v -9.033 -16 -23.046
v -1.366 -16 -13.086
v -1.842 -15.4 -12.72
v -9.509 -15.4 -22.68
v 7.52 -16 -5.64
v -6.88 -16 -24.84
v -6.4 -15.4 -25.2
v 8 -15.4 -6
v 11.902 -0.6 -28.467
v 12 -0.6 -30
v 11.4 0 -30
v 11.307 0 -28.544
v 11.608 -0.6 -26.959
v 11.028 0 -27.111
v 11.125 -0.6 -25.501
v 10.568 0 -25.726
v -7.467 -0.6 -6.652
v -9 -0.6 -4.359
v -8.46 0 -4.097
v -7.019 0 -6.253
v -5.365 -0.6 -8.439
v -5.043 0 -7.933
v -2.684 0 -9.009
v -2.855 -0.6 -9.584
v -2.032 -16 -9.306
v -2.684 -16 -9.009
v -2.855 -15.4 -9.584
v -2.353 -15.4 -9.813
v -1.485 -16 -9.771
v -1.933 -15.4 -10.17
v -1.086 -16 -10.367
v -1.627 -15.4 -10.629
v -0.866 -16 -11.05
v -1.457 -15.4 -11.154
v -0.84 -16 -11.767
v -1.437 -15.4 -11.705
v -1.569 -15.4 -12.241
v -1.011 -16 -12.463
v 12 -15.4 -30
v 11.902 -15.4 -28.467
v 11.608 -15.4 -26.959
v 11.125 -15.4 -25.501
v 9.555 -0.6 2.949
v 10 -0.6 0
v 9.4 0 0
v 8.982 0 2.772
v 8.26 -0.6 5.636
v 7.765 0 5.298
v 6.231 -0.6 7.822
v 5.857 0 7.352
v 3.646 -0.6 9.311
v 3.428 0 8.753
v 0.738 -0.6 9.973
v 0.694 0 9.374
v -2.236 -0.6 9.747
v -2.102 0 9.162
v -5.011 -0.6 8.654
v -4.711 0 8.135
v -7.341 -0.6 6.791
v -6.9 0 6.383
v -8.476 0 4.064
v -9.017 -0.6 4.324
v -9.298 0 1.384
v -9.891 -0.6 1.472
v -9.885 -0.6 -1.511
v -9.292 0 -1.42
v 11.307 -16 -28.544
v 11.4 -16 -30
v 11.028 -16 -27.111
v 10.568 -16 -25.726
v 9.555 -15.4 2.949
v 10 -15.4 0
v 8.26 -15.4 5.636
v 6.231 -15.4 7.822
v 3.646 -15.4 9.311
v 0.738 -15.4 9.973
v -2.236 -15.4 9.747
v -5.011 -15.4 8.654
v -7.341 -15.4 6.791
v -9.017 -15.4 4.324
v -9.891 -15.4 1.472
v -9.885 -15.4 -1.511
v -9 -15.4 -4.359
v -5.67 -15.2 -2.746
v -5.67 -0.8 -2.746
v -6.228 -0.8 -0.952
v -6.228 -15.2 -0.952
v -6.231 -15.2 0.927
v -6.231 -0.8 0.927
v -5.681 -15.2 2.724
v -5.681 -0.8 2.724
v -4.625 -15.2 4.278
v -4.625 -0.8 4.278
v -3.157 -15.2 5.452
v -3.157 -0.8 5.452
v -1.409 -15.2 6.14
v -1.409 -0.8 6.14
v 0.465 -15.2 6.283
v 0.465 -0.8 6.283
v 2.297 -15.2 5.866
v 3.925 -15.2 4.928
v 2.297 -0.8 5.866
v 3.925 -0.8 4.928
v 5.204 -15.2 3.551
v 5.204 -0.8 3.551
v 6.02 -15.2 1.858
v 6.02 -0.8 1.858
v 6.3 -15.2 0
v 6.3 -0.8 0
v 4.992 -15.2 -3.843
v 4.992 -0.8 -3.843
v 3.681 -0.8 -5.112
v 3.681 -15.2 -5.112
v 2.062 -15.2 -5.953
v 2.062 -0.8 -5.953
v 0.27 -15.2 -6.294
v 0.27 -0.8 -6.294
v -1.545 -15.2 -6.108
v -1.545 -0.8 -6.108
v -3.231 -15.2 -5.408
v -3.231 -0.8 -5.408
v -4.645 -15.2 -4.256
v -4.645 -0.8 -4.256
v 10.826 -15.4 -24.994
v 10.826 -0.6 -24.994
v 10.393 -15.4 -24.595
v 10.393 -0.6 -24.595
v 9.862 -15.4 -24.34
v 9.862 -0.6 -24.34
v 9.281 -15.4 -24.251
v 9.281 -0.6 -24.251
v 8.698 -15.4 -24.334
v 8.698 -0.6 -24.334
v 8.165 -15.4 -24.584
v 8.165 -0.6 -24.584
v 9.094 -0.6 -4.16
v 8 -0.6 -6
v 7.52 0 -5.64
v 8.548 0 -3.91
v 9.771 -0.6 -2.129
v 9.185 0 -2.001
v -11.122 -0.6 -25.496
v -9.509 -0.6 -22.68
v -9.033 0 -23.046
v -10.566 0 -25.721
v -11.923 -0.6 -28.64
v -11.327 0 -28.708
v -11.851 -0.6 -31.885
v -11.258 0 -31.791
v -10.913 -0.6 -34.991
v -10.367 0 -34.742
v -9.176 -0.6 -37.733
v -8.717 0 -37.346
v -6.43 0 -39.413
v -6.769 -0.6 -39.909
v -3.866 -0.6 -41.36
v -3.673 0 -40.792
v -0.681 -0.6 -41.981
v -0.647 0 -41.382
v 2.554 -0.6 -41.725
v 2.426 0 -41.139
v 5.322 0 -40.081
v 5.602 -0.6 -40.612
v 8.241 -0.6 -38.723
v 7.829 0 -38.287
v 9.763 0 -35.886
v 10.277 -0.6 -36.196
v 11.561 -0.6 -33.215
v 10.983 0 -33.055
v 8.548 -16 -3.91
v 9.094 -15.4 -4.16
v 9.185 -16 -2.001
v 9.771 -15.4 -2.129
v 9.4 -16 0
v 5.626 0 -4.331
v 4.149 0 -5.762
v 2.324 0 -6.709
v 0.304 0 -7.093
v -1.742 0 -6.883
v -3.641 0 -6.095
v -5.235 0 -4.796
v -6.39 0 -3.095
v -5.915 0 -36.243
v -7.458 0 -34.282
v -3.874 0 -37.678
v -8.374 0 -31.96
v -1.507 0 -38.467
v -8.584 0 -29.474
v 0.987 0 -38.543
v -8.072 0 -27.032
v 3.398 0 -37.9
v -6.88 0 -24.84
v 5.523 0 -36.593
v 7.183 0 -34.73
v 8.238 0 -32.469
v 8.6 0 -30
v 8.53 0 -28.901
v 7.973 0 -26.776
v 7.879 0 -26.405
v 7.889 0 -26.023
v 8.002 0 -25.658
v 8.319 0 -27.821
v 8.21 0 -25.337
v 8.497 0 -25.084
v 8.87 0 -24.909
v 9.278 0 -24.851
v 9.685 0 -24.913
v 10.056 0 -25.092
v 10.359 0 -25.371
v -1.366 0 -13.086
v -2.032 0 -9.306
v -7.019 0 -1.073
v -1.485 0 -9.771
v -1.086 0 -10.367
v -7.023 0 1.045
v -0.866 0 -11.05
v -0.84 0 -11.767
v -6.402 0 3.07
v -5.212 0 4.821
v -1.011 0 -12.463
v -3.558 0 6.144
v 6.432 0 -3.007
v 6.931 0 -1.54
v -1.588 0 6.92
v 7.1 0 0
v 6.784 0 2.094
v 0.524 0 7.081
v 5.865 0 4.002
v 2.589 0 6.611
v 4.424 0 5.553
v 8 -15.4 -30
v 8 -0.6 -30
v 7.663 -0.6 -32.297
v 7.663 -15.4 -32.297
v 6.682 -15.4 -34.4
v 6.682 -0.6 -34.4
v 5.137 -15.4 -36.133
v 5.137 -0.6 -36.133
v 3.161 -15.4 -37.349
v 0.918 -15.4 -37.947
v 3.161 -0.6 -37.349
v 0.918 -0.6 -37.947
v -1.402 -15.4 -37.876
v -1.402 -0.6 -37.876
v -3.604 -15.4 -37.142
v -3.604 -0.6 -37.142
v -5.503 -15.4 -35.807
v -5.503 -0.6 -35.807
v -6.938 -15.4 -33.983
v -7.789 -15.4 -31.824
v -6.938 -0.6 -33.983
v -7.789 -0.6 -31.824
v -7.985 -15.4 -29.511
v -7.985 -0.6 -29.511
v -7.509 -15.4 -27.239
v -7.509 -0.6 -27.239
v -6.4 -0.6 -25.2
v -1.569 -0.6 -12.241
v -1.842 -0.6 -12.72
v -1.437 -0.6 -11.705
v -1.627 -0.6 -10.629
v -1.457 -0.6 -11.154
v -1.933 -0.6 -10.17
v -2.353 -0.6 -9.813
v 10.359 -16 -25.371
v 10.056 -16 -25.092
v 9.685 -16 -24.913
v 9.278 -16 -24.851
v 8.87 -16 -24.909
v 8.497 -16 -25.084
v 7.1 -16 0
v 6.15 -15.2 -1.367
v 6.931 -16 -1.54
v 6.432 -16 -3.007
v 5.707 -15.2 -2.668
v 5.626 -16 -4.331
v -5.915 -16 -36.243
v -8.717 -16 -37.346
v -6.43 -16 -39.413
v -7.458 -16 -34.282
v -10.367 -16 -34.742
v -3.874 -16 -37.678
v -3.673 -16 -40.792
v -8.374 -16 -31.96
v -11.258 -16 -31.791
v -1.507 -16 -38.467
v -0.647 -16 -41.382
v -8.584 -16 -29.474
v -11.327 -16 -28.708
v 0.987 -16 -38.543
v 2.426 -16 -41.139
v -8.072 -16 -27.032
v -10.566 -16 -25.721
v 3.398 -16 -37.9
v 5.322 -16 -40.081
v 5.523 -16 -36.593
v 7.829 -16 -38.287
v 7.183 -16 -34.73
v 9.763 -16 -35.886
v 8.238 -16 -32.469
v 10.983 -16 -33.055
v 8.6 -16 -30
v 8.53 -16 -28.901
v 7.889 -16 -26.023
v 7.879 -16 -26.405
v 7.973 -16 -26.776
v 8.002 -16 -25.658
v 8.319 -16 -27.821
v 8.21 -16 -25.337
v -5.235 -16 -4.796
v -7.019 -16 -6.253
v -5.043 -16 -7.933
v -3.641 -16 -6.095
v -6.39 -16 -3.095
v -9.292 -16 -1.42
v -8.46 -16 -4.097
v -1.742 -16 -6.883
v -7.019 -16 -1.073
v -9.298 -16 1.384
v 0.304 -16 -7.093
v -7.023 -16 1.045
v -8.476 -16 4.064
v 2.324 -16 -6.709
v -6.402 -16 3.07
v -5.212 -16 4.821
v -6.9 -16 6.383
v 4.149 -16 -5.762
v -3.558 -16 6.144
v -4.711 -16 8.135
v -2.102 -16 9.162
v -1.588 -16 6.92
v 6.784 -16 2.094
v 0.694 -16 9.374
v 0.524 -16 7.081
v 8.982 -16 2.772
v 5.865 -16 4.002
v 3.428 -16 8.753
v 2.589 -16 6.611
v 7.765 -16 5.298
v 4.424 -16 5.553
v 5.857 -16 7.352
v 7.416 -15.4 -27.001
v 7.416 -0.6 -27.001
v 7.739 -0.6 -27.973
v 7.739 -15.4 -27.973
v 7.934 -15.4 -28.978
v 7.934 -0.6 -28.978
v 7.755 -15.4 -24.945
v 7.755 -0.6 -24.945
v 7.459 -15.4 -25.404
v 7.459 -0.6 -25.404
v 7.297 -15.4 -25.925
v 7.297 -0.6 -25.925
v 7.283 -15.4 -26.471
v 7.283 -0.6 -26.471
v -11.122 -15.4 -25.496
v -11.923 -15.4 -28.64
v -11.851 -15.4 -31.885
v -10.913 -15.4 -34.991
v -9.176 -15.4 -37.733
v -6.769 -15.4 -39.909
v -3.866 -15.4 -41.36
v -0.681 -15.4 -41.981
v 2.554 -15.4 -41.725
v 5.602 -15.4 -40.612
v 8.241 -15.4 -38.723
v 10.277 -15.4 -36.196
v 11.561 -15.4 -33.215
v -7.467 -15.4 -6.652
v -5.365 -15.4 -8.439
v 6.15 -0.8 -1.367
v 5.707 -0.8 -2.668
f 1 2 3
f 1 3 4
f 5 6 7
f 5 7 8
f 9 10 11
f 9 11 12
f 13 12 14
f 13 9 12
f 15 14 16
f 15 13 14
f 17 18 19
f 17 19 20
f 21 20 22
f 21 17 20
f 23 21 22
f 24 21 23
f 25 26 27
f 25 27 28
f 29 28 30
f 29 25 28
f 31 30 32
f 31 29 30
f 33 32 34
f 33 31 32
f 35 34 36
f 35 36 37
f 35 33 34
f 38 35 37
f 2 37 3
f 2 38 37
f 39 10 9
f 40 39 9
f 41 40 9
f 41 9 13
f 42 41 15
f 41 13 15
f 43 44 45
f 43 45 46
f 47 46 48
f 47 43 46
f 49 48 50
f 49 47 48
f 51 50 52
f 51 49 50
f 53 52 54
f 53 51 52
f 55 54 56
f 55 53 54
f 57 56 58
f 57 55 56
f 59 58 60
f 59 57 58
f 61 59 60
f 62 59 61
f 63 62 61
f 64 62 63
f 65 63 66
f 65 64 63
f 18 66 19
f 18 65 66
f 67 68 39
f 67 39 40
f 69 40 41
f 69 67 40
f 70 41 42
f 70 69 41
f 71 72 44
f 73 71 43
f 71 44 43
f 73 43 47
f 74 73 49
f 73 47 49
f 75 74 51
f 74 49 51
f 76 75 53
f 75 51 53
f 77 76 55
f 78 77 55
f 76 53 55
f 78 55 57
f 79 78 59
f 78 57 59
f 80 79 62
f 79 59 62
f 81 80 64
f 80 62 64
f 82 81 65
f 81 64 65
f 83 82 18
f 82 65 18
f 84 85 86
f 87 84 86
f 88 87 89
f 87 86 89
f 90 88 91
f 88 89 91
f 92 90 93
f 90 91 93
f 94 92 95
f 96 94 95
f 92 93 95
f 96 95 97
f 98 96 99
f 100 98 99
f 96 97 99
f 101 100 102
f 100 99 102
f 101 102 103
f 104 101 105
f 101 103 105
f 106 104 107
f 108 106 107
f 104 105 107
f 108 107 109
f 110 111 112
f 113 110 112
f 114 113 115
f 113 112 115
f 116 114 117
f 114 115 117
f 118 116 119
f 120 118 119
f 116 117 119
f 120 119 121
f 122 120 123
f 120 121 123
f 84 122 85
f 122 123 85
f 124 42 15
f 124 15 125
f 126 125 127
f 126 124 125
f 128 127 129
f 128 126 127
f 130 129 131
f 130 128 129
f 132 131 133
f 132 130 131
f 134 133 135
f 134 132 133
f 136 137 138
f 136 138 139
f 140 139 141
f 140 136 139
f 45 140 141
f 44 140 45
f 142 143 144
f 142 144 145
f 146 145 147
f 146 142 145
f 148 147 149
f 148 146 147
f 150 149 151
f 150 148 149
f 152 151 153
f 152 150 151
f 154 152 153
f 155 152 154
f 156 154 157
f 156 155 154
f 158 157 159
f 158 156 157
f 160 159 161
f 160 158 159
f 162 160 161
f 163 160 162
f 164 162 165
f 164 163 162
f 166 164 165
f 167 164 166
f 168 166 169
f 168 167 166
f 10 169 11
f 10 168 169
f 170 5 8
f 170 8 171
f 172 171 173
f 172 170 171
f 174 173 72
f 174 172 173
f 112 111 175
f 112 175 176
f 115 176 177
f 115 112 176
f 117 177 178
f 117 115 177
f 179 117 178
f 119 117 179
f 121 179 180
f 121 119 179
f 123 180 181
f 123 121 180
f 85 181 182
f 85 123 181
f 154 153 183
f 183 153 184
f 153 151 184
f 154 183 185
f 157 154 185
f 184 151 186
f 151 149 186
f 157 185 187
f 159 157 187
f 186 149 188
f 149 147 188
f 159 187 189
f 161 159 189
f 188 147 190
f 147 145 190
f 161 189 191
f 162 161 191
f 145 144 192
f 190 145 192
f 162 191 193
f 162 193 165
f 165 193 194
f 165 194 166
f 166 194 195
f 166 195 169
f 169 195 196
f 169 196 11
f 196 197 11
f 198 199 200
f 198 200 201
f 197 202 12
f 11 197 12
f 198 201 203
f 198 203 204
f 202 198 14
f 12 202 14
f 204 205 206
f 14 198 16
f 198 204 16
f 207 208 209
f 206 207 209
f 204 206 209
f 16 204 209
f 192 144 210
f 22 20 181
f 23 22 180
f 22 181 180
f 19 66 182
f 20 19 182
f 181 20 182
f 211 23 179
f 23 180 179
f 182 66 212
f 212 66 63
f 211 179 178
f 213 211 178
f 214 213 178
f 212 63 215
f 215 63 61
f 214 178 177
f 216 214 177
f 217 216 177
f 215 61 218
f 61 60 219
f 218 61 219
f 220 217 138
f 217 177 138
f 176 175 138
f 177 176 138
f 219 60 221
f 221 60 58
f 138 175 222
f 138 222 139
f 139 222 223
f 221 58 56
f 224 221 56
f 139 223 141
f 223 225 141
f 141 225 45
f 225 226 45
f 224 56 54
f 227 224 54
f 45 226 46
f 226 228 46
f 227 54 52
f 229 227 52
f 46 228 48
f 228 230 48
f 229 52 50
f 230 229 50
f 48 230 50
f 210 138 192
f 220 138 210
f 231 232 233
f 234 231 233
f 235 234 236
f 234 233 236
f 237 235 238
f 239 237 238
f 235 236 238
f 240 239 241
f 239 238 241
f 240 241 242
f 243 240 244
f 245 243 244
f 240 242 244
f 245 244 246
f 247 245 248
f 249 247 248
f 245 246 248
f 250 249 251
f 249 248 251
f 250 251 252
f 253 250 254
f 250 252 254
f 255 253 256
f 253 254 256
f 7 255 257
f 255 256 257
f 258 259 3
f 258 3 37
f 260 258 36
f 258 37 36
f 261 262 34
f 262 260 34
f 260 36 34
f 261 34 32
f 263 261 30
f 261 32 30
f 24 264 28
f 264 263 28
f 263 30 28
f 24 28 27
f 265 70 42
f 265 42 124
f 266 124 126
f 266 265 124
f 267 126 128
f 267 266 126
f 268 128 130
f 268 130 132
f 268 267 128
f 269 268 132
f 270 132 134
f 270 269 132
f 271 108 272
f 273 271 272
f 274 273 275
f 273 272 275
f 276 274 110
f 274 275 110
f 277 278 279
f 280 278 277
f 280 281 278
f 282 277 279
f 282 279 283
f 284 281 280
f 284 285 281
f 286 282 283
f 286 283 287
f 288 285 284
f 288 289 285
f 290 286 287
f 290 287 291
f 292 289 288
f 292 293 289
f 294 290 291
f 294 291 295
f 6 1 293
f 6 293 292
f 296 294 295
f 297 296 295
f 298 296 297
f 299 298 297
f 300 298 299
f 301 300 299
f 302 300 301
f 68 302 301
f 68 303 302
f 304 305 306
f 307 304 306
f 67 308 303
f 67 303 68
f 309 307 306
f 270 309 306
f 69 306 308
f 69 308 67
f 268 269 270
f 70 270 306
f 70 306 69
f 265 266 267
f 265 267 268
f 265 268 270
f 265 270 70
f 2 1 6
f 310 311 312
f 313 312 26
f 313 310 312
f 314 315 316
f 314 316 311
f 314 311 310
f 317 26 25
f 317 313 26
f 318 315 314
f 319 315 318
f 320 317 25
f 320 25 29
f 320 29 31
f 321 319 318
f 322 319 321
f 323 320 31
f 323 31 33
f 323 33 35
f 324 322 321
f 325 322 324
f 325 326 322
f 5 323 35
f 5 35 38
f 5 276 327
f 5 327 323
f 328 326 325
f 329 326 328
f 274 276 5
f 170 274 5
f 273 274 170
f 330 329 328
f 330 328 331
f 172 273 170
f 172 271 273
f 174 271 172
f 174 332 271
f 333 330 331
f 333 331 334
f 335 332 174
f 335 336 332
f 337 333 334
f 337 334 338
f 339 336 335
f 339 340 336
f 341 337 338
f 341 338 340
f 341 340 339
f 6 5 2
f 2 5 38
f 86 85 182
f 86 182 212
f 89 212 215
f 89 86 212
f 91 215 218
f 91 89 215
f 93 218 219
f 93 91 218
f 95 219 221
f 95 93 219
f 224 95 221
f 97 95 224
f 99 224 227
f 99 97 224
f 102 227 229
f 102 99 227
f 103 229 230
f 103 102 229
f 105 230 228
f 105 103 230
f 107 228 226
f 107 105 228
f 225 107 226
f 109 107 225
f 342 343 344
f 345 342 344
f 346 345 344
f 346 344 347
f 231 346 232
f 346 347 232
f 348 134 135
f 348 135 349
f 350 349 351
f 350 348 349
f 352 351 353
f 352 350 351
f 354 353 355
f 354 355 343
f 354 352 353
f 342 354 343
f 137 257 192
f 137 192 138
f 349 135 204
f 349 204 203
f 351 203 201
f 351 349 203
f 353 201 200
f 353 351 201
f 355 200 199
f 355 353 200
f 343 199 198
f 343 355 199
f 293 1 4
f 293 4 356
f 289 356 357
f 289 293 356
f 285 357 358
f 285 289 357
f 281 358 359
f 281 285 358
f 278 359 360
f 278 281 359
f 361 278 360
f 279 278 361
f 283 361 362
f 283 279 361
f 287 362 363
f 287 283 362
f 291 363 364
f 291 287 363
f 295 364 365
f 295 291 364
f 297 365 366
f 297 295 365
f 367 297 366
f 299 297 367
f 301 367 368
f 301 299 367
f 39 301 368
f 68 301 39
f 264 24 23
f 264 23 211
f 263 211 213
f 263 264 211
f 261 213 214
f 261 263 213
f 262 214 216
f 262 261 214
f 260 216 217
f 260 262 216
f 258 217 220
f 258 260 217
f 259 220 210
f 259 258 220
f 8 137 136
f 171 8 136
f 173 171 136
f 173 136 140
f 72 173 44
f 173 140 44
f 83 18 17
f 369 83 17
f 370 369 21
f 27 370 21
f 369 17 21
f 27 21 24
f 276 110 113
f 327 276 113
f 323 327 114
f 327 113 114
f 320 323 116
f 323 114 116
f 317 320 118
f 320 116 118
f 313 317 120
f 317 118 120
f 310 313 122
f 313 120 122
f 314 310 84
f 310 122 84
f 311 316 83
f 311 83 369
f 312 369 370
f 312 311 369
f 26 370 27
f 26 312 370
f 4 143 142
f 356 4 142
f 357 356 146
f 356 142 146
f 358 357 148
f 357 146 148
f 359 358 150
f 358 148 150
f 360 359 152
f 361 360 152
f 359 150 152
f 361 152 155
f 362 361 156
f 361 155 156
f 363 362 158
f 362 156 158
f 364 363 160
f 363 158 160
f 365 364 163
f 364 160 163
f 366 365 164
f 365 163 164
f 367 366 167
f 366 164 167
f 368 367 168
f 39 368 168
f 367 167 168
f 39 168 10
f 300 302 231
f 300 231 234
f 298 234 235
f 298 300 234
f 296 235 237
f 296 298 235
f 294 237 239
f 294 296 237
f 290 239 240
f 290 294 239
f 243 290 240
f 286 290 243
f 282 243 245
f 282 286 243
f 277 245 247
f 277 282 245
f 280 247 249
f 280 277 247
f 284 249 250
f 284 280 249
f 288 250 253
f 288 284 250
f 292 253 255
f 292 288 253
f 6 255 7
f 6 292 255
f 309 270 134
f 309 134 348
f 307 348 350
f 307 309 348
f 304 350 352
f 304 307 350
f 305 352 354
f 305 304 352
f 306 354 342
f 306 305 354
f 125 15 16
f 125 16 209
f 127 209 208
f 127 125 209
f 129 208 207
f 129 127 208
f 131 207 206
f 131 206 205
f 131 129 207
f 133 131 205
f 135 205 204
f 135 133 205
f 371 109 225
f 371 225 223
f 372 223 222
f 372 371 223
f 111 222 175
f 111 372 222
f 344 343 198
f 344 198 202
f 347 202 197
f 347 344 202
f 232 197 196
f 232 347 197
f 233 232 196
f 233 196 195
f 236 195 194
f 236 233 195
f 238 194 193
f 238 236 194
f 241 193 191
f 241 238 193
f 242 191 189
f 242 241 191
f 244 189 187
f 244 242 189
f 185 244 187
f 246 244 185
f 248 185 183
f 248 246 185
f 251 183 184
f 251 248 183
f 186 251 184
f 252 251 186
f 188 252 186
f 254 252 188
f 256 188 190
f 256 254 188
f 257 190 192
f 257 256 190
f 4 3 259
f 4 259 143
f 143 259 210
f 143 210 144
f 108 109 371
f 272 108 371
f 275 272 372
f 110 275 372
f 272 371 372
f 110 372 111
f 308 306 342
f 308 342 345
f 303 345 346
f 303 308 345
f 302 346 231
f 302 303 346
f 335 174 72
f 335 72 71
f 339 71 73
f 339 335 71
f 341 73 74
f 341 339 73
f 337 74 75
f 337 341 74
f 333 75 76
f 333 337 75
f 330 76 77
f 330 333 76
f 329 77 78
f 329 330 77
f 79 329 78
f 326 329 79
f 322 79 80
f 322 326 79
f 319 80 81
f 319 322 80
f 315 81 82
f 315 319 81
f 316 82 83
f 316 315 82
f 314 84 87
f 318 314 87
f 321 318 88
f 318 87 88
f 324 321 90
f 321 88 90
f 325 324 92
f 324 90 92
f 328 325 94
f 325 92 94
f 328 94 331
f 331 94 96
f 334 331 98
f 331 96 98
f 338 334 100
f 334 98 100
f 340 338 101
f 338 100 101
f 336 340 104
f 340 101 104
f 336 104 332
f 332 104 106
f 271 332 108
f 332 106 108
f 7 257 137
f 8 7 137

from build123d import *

# Parameters (mm, degrees)
F1_DEPTH = 16
F2_R     = 1.99999
F3_SIZE  = 0.8
F4_SIZE  = 0.6


# Not quite as in the source:
# - a fillet or chamfer is up to 0.001 mm smaller than in the source, because OpenCascade refuses the exact size


with BuildPart() as f1:
    # F0 (on Front) → F1 (new body)
    with BuildSketch(Plane.XZ):
        with BuildLine():
            ThreePointArc((6.3, 0), (5.9640762947, -2.0297275557), (4.9921289046, -3.843))
            Line((4.9921289046, -3.843), (0.2548985956, -9.9967508074))
            ThreePointArc((0.2548985956, -9.9967508074), (4.5857760478, -8.8865436498), (8, -6))
            ThreePointArc((8, -6), (9.4868329805, -3.1622776602), (10, 0))
            ThreePointArc((10, 0), (-2.2360679775, 9.7467943448), (-9, -4.3588989435))
            Line((-9, -4.3588989435), (-5.67, -2.7461063344))
            ThreePointArc((-5.67, -2.7461063344), (-1.4087228258, 6.1404804372), (6.3, 0))
        make_face()
        with BuildLine():
            ThreePointArc((8, -6), (4.5857760478, -8.8865436498), (0.2548985956, -9.9967508074))
            Line((0.2548985956, -9.9967508074), (-9.5088169611, -22.68))
            ThreePointArc((-9.5088169611, -22.68), (-5.7581726954, -19.4717785353), (-1.033436854, -18.044582472))
            Line((-1.033436854, -18.044582472), (8, -6))
        make_face()
        with BuildLine():
            ThreePointArc((-1.033436854, -18.044582472), (-5.7581726954, -19.4717785353), (-9.5088169611, -22.68))
            ThreePointArc((-9.5088169611, -22.68), (-3.8661477252, -41.3601453233), (12, -30))
            ThreePointArc((12, -30), (11.4891252931, -26.5358983849), (10, -23.3667504193))
            Line((10, -23.3667504193), (6.6666666667, -25.5778336129))
            ThreePointArc((6.6666666667, -25.5778336129), (7.6594168621, -27.6905989232), (8, -30))
            ThreePointArc((8, -30), (-2.5298221281, -37.5894663844), (-6.4, -25.2))
            Line((-6.4, -25.2), (-1.033436854, -18.044582472))
        make_face()
        with BuildLine():
            Line((0.2548985956, -9.9967508074), (4.9921289046, -3.843))
            ThreePointArc((4.9921289046, -3.843), (-0.6447257044, -6.2669233892), (-5.67, -2.7461063344))
            Line((-5.67, -2.7461063344), (-9, -4.3588989435))
            ThreePointArc((-9, -4.3588989435), (-5.202455483, -8.5401672669), (0.2548985956, -9.9967508074))
        make_face()
    extrude(amount=F1_DEPTH)

    # F2 (radius 2 in the source; OpenCascade refuses exactly that, so slightly less here)
    f2_edges = [f1.edges().sort_by_distance(p)[0] for p in [
        (4.992129, -8, -3.843),
        (8, -8, -6),
        (10, -8, -23.36675),
        (6.666667, -8, -25.577834),
        (0.254899, -8, -9.996751),
    ]]
    fillet(f2_edges, radius=F2_R)

    # F3
    f3_edges = [f1.edges().sort_by_distance(p)[0] for p in [
        (-4.992129, -16, 3.843),
        (-4.992129, 0, 3.843),
    ]]
    chamfer(f3_edges, length=F3_SIZE)

    # F4
    f4_edges = [f1.edges().sort_by_distance(p)[0] for p in [
        (-3.134832, -16, 9.495937),
        (0.8, 0, -15.6),
        (-5.675293, 0, -17.70018),
        (-1.523485, 0, -10.885342),
        (-1.625379, 0, -41.889413),
        (-3.134832, 0, 9.495937),
        (9.862297, 0, -24.340194),
        (8.164968, 0, -24.583973),
        (-1.033792, 0, -37.932923),
        (7.360063, 0, -25.658852),
        (-5.675293, -16, -17.70018),
        (-1.523485, -16, -10.885342),
        (-1.625379, -16, -41.889413),
        (9.862297, -16, -24.340194),
        (0.8, -16, -15.6),
        (8.164968, -16, -24.583973),
        (-1.033792, -16, -37.932923),
        (7.360063, -16, -25.658852),
    ]]
    chamfer(f4_edges, length=F4_SIZE)


solid = f1.part
